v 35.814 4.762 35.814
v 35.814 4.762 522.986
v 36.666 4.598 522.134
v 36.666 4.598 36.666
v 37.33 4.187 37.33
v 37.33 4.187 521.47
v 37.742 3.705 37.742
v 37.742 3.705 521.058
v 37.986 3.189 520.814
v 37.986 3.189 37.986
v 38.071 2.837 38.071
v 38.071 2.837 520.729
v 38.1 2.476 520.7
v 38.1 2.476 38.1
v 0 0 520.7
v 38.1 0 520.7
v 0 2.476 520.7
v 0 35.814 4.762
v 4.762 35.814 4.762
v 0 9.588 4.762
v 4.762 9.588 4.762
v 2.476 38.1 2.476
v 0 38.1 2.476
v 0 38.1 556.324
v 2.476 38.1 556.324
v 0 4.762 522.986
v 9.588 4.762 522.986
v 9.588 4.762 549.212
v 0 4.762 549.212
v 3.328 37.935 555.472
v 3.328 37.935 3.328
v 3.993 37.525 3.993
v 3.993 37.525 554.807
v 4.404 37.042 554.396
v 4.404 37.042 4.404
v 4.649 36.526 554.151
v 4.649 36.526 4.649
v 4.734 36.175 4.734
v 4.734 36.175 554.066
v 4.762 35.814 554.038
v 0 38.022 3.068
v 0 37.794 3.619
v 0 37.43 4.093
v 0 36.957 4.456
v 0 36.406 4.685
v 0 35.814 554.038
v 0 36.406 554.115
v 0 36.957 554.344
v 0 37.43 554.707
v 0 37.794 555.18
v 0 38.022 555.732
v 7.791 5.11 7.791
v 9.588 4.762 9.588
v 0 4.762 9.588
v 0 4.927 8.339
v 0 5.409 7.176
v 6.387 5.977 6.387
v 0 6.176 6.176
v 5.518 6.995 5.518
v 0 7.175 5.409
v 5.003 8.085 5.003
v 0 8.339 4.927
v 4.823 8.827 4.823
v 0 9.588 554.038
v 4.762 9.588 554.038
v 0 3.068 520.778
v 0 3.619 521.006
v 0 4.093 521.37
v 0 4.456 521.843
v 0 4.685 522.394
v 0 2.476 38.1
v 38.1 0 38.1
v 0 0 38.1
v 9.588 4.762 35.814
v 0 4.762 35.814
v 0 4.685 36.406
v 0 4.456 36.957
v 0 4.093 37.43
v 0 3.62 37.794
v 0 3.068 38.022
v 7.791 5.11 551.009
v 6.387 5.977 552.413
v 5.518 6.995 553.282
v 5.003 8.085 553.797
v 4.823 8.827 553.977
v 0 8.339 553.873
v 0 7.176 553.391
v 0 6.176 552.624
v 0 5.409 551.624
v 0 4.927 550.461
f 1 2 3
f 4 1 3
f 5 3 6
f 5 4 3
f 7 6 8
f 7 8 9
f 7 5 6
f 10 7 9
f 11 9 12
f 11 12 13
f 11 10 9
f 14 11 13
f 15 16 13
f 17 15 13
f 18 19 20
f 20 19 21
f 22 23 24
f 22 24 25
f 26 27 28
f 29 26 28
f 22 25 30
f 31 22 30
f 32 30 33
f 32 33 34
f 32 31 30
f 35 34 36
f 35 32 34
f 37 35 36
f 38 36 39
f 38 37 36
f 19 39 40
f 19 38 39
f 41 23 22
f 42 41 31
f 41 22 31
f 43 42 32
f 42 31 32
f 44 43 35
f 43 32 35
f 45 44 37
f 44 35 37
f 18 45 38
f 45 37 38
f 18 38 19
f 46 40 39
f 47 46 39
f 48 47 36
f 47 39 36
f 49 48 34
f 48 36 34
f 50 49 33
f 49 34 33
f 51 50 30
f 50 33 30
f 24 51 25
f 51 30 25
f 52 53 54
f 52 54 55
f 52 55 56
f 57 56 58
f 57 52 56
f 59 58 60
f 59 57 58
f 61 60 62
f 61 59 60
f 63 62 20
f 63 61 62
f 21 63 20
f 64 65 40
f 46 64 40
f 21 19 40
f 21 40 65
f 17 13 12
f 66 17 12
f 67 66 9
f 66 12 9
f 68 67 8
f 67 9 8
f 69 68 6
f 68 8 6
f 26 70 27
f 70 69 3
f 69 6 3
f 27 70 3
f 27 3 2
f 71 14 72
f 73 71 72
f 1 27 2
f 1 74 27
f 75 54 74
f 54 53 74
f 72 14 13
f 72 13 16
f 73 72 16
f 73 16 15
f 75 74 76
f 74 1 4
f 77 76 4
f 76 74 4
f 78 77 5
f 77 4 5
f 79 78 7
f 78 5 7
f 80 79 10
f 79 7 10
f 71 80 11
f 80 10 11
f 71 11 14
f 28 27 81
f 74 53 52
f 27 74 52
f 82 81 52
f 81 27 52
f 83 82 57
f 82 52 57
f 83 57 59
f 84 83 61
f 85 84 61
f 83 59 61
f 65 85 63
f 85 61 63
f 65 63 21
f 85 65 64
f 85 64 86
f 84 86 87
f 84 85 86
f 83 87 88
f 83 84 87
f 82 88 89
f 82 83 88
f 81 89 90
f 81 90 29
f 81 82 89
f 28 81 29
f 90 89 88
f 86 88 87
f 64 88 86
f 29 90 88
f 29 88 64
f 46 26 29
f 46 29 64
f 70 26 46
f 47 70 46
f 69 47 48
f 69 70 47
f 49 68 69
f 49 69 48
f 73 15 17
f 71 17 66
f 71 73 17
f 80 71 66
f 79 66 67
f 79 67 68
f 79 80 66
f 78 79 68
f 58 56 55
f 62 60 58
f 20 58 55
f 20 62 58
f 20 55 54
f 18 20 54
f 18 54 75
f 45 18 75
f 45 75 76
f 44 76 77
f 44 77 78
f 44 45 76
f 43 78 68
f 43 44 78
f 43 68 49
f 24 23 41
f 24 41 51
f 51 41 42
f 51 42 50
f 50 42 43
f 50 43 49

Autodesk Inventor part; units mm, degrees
ref_plane "Start plane" through (0, 0, 0) normal (0, 0, 1) x (1, 0, 0)
ref_plane "End plane" through (0, 0, 558.8) normal (0, 0, 1) x (1, 0, 0)
sketch "Sketch" plane through (0, 0, 0) normal (0, 0, 1) x (1, 0, 0)
  line L0 (38.1, 0) -> (0, 0)
  line L1 (0, 0) -> (0, 38.1)
  line L2 (0, 38.1) -> (2.4765, 38.1)
  line L3 (4.7625, 35.814) -> (4.7625, 9.5885)
  line L4 (9.5885, 4.7625) -> (35.814, 4.7625)
  line L5 (38.1, 2.4765) -> (38.1, 0)
  line L6 (0, -11.0414) -> (0, 31.5385) construction
  line L7 (-11.0414, 0) -> (31.5385, 0) construction
  arc A0 (4.7625, 9.5885) -> (9.5885, 4.7625) centre (9.5885, 9.5885) ccw
  arc A1 (4.7625, 35.814) -> (2.4765, 38.1) centre (2.4765, 35.814) ccw
  arc A2 (38.1, 2.4765) -> (35.814, 4.7625) centre (35.814, 2.4765) ccw
  line L8 (0, 48.4964) -> (0, -20.9644) construction
  line L9 (-20.9644, 0) -> (48.4964, 0) construction
  point P0 (4.7625, 38.1)
  point P1 (4.7625, 4.7625)
  point P2 (38.1, 4.7625)
  dimension "d0" = 38.1
  dimension "d1" = 38.1
  dimension "d2" = 4.7625
  dimension "d3" = 4.7625
  dimension "d10" = 0
  dimension "d11" = 0
  dimension "d14" = 4.826
  dimension "d15" = 2.286
extrude "Body" add sketch "Sketch" along normal up to surface (558.8 mm away) from surface at 0
sketch "Sketch3" plane through (0, 0, 0) normal (0, 0, 1) x (1, 0, 0)
  line L0 (0, 0) -> (10, 0)
ref_plane "Work Plane3" through (0, 0, 0) normal (0, -1, 0) x (1, 0, 0)
sketch "Sketch4" plane through (0, 0, 0) normal (0, -1, 0) x (1, 0, 0)
  line L0 (-2, 0) -> (12, 0)
  line L1 (-2, 558.8) -> (12, 558.8)
  dimension "d17" = 558.8
ref_plane "Work Plane4" through (1101.598, 19.05, 0) normal (0.7071, 0, 0.7071) x (0.7071, 0, -0.7071)
ref_plane "Work Plane5" through (-130.302, 19.05, 0) normal (-0.7071, 0, 0.7071) x (0.7071, 0, 0.7071)
ref_plane "Work Plane6" through (485.648, 0, 0) normal (-1, 0, 0) x (0, 0, 1)
sketch "Sketch5" plane through (485.648, 0, 0) normal (-1, 0, 0) x (0, 0, 1)
  line L0 (38.1, 0) -> (0, 0)
  line L1 (0, 0) -> (0, 38.1)
  line L2 (0, 38.1) -> (2.4765, 38.1)
  arc A0 (4.7625, 35.814) -> (2.4765, 38.1) centre (2.4765, 35.814) ccw
  line L3 (4.7625, 35.814) -> (4.7625, 9.5885)
  arc A1 (4.7625, 9.5885) -> (9.5885, 4.7625) centre (9.5885, 9.5885) ccw
  line L4 (9.5885, 4.7625) -> (35.814, 4.7625)
  arc A2 (38.1, 2.4765) -> (35.814, 4.7625) centre (35.814, 2.4765) ccw
  line L5 (38.1, 2.4765) -> (38.1, 0)
extrude "Extrusion2" cut sketch "Sketch5" along normal up to surface from surface at -615.95 surface through (-130.302, 19.05, 0) normal (-0.7071, 0, 0.7071)
ref_plane "Work Plane7" through (1101.598, 19.05, 558.8) normal (0.7071, 0, -0.7071) x (0, 1, 0)
ref_plane "Work Plane8" through (-130.302, 19.05, 558.8) normal (-0.7071, 0, -0.7071) x (0, 1, 0)
ref_plane "Work Plane9" through (485.648, 0, 558.8) normal (-1, 0, 0) x (0, 1, 0)
sketch "Sketch6" plane through (485.648, 0, 558.8) normal (-1, 0, 0) x (0, 1, 0)
  line L0 (38.1, 0) -> (0, 0)
  line L1 (0, 0) -> (0, 38.1)
  line L2 (0, 38.1) -> (2.4765, 38.1)
  arc A0 (4.7625, 35.814) -> (2.4765, 38.1) centre (2.4765, 35.814) ccw
  line L3 (4.7625, 35.814) -> (4.7625, 9.5885)
  arc A1 (4.7625, 9.5885) -> (9.5885, 4.7625) centre (9.5885, 9.5885) ccw
  line L4 (9.5885, 4.7625) -> (35.814, 4.7625)
  arc A2 (38.1, 2.4765) -> (35.814, 4.7625) centre (35.814, 2.4765) ccw
  line L5 (38.1, 2.4765) -> (38.1, 0)
extrude "Extrusion3" cut sketch "Sketch6" along normal up to surface from surface at -615.95 surface through (-130.302, 19.05, 558.8) normal (-0.7071, 0, -0.7071)
equation "\"d0\" = G_H"
equation "\"d1\" = G_H"
equation "\"d2\" = G_T"
equation "\"d3\" = G_T"
equation "\"d14\" = G_IR"
equation "\"d15\" = G_ER"
equation "\"d4\" = G_L"
equation "\"G_H\" = 38.1"
equation "\"G_T\" = 4.7625"
equation "\"G_ER\" = 2.286"
equation "\"G_IR\" = 4.826"
equation "\"G_L\" = d17"
equation "\"ex\" = 0"
equation "\"G_OFFSET_START\" = 0"
equation "\"G_OFFSET_END\" = 0"
equation "\"d13\" = G_OFFSET_END + B_L"
equation "\"B_L\" = 558.8"
properties part number "AISC - L 1.5 x 1.5 x 3/16 - 22" material "Aluminum 6061"
